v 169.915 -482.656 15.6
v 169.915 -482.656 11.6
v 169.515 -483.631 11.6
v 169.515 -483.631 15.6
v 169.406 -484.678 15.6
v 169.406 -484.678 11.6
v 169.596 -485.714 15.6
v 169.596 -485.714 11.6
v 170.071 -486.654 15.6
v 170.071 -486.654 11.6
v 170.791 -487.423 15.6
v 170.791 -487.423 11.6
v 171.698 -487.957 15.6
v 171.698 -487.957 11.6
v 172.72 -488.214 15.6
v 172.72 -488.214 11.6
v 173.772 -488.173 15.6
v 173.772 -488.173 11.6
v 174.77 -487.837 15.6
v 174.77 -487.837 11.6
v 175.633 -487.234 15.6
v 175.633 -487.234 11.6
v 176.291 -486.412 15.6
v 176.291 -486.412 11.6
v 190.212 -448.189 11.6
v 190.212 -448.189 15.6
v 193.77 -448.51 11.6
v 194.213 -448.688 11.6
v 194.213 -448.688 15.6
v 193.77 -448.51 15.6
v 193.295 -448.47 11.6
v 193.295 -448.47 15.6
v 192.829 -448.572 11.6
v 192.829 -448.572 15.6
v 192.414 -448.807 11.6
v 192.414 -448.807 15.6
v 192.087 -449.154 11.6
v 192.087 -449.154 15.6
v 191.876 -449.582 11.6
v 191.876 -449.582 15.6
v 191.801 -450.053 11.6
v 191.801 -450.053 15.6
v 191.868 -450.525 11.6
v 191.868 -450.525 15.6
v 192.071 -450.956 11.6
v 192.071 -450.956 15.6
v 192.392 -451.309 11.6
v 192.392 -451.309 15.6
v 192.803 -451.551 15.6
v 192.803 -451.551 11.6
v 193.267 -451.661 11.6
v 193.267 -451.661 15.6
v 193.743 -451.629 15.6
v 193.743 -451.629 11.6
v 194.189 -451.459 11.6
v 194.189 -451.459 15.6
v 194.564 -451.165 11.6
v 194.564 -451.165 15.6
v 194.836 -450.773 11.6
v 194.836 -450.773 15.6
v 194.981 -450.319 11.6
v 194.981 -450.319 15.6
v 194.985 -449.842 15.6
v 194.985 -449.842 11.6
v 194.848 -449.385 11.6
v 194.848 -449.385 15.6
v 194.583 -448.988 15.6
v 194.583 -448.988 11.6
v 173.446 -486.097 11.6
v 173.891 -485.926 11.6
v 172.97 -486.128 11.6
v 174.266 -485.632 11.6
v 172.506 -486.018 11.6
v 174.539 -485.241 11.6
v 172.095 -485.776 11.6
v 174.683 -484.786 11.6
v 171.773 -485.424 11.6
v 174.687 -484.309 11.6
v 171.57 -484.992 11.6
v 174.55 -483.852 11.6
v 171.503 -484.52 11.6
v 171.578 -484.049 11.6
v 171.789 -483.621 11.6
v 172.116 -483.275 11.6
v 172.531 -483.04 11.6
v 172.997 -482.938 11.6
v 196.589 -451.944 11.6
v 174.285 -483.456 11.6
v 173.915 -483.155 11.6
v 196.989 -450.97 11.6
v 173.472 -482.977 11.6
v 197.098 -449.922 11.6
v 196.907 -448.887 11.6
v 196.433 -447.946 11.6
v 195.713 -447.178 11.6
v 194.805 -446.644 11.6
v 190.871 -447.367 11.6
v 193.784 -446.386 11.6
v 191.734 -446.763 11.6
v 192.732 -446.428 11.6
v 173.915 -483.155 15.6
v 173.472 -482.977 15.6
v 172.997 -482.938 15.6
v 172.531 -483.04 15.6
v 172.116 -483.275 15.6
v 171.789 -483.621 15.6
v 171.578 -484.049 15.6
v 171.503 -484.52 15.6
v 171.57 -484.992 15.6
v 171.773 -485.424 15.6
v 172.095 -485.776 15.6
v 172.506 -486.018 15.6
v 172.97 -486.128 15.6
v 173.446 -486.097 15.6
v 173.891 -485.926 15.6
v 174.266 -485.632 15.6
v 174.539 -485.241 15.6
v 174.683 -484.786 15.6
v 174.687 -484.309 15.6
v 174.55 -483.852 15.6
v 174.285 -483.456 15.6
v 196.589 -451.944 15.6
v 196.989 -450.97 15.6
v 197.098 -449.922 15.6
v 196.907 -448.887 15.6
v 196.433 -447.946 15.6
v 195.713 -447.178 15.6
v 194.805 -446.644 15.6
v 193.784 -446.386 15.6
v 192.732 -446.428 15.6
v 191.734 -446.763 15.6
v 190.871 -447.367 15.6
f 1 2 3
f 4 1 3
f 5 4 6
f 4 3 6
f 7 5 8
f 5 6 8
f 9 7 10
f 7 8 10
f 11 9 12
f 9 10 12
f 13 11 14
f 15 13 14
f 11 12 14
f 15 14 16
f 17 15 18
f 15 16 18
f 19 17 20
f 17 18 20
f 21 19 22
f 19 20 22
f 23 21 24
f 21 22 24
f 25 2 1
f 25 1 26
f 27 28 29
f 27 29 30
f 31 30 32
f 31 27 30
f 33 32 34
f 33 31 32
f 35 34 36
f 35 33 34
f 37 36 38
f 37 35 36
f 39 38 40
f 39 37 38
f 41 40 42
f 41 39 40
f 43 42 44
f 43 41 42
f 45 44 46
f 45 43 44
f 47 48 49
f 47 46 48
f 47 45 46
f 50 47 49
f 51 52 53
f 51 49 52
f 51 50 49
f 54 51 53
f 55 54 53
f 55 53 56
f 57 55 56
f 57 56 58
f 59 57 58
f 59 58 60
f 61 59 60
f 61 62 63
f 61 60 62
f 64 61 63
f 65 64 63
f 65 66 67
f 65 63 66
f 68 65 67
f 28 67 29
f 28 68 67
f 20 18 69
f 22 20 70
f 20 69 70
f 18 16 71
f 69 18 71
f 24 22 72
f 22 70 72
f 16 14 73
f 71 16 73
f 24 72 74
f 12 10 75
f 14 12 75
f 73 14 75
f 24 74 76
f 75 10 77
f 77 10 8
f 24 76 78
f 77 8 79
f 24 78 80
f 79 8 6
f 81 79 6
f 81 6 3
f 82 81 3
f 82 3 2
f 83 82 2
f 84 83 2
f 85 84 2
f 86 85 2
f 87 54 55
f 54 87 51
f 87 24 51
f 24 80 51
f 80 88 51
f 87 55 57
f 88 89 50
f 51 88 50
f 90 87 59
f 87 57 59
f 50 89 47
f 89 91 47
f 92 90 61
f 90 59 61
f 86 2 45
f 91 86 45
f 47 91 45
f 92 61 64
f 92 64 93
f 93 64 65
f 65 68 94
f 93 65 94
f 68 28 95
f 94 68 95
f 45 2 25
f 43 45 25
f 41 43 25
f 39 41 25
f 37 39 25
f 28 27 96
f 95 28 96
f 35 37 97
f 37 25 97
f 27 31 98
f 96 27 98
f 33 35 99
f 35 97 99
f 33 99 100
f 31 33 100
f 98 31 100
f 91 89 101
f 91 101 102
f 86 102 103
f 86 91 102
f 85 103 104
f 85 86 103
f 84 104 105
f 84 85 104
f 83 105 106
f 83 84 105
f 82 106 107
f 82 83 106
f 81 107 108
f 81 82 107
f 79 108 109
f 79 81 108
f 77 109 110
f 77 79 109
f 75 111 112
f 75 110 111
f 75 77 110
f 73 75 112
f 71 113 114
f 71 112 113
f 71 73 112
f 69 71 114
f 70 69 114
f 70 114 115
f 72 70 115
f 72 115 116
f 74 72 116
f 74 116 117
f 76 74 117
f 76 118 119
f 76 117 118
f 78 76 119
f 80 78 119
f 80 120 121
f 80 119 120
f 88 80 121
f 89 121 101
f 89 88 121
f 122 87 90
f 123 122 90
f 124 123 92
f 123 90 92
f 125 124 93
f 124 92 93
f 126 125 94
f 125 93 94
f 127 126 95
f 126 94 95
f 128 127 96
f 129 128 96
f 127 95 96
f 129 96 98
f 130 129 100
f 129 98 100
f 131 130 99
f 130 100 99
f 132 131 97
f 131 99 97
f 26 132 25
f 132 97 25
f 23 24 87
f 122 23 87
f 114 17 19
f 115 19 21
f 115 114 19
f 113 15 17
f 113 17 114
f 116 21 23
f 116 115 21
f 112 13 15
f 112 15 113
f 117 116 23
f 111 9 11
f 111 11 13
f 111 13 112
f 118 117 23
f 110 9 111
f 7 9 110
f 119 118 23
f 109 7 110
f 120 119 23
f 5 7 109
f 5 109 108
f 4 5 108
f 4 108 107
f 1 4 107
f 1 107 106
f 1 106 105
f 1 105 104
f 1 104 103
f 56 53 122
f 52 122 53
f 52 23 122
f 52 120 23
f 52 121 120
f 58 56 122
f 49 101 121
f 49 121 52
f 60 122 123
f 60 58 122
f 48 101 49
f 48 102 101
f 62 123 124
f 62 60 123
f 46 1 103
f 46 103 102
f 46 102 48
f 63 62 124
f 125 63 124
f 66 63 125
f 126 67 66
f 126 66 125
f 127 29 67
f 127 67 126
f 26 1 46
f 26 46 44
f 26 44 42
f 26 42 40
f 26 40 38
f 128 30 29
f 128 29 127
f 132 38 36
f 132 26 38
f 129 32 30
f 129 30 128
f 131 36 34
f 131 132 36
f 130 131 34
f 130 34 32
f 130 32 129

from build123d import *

# Parameters (mm, degrees)
CYLINDER005_R            = 1.6
CYLINDER005_DEPTH        = 30
PAD002_DEPTH             = 4
CLONE007_PLACEMENT_ANGLE = 59.5063808355
CLONE181_PLACEMENT_ANGLE = 1.91645e-05


with BuildPart() as finger_drill_master:
    # Cylinder005 → Cylinder005 (new body)
    with BuildSketch(Plane.XY.offset(-8)):
        Circle(CYLINDER005_R)
    extrude(amount=CYLINDER005_DEPTH)


with BuildPart() as clone006:
    # Clone006 base: copy of finger-drill-master
    add(finger_drill_master.part)


with BuildPart() as clone006_1:
    # Clone006 placement: moved
    add(clone006.part.moved(Location((40, 0, 0))))


with BuildPart() as fusion012:
    # Clone005 base: copy of finger-drill-master
    add(finger_drill_master.part)

    # Fusion012: union Clone006
    add(clone006_1.part)


with BuildPart() as clone_of_left_link:
    # Sketch002 → Pad002 (new body)
    with BuildSketch(Plane.XY):
        with BuildLine():
            ThreePointArc((0, 3.7), (-3.7, 0), (0, -3.7))
            Line((0, -3.7), (40, -3.7))
            ThreePointArc((40, -3.7), (43.7, 0), (40, 3.7))
            Line((0, 3.7), (40, 3.7))
        make_face()
    extrude(amount=PAD002_DEPTH)

    # Cut001: cut Fusion012
    add(fusion012.part, mode=Mode.SUBTRACT)


with BuildPart() as clone_of_left_link_1:
    # Clone007 placement: moved
    add(clone_of_left_link.part.moved(Location((187.1034801236, 214.4662976869, 4.3))).rotate(Axis((187.1034801236, 214.4662976869, 4.3), (0, 0, 1)), CLONE007_PLACEMENT_ANGLE))


with BuildPart() as clone_of_left_link_2:
    # Clone181 placement: moved
    add(clone_of_left_link_1.part.moved(Location((-14.0004083881, -699.0003602699, 7.3))).rotate(Axis((-14.0004083881, -699.0003602699, 7.3), (0, 0, 1)), CLONE181_PLACEMENT_ANGLE))


solid = clone_of_left_link_2.part
